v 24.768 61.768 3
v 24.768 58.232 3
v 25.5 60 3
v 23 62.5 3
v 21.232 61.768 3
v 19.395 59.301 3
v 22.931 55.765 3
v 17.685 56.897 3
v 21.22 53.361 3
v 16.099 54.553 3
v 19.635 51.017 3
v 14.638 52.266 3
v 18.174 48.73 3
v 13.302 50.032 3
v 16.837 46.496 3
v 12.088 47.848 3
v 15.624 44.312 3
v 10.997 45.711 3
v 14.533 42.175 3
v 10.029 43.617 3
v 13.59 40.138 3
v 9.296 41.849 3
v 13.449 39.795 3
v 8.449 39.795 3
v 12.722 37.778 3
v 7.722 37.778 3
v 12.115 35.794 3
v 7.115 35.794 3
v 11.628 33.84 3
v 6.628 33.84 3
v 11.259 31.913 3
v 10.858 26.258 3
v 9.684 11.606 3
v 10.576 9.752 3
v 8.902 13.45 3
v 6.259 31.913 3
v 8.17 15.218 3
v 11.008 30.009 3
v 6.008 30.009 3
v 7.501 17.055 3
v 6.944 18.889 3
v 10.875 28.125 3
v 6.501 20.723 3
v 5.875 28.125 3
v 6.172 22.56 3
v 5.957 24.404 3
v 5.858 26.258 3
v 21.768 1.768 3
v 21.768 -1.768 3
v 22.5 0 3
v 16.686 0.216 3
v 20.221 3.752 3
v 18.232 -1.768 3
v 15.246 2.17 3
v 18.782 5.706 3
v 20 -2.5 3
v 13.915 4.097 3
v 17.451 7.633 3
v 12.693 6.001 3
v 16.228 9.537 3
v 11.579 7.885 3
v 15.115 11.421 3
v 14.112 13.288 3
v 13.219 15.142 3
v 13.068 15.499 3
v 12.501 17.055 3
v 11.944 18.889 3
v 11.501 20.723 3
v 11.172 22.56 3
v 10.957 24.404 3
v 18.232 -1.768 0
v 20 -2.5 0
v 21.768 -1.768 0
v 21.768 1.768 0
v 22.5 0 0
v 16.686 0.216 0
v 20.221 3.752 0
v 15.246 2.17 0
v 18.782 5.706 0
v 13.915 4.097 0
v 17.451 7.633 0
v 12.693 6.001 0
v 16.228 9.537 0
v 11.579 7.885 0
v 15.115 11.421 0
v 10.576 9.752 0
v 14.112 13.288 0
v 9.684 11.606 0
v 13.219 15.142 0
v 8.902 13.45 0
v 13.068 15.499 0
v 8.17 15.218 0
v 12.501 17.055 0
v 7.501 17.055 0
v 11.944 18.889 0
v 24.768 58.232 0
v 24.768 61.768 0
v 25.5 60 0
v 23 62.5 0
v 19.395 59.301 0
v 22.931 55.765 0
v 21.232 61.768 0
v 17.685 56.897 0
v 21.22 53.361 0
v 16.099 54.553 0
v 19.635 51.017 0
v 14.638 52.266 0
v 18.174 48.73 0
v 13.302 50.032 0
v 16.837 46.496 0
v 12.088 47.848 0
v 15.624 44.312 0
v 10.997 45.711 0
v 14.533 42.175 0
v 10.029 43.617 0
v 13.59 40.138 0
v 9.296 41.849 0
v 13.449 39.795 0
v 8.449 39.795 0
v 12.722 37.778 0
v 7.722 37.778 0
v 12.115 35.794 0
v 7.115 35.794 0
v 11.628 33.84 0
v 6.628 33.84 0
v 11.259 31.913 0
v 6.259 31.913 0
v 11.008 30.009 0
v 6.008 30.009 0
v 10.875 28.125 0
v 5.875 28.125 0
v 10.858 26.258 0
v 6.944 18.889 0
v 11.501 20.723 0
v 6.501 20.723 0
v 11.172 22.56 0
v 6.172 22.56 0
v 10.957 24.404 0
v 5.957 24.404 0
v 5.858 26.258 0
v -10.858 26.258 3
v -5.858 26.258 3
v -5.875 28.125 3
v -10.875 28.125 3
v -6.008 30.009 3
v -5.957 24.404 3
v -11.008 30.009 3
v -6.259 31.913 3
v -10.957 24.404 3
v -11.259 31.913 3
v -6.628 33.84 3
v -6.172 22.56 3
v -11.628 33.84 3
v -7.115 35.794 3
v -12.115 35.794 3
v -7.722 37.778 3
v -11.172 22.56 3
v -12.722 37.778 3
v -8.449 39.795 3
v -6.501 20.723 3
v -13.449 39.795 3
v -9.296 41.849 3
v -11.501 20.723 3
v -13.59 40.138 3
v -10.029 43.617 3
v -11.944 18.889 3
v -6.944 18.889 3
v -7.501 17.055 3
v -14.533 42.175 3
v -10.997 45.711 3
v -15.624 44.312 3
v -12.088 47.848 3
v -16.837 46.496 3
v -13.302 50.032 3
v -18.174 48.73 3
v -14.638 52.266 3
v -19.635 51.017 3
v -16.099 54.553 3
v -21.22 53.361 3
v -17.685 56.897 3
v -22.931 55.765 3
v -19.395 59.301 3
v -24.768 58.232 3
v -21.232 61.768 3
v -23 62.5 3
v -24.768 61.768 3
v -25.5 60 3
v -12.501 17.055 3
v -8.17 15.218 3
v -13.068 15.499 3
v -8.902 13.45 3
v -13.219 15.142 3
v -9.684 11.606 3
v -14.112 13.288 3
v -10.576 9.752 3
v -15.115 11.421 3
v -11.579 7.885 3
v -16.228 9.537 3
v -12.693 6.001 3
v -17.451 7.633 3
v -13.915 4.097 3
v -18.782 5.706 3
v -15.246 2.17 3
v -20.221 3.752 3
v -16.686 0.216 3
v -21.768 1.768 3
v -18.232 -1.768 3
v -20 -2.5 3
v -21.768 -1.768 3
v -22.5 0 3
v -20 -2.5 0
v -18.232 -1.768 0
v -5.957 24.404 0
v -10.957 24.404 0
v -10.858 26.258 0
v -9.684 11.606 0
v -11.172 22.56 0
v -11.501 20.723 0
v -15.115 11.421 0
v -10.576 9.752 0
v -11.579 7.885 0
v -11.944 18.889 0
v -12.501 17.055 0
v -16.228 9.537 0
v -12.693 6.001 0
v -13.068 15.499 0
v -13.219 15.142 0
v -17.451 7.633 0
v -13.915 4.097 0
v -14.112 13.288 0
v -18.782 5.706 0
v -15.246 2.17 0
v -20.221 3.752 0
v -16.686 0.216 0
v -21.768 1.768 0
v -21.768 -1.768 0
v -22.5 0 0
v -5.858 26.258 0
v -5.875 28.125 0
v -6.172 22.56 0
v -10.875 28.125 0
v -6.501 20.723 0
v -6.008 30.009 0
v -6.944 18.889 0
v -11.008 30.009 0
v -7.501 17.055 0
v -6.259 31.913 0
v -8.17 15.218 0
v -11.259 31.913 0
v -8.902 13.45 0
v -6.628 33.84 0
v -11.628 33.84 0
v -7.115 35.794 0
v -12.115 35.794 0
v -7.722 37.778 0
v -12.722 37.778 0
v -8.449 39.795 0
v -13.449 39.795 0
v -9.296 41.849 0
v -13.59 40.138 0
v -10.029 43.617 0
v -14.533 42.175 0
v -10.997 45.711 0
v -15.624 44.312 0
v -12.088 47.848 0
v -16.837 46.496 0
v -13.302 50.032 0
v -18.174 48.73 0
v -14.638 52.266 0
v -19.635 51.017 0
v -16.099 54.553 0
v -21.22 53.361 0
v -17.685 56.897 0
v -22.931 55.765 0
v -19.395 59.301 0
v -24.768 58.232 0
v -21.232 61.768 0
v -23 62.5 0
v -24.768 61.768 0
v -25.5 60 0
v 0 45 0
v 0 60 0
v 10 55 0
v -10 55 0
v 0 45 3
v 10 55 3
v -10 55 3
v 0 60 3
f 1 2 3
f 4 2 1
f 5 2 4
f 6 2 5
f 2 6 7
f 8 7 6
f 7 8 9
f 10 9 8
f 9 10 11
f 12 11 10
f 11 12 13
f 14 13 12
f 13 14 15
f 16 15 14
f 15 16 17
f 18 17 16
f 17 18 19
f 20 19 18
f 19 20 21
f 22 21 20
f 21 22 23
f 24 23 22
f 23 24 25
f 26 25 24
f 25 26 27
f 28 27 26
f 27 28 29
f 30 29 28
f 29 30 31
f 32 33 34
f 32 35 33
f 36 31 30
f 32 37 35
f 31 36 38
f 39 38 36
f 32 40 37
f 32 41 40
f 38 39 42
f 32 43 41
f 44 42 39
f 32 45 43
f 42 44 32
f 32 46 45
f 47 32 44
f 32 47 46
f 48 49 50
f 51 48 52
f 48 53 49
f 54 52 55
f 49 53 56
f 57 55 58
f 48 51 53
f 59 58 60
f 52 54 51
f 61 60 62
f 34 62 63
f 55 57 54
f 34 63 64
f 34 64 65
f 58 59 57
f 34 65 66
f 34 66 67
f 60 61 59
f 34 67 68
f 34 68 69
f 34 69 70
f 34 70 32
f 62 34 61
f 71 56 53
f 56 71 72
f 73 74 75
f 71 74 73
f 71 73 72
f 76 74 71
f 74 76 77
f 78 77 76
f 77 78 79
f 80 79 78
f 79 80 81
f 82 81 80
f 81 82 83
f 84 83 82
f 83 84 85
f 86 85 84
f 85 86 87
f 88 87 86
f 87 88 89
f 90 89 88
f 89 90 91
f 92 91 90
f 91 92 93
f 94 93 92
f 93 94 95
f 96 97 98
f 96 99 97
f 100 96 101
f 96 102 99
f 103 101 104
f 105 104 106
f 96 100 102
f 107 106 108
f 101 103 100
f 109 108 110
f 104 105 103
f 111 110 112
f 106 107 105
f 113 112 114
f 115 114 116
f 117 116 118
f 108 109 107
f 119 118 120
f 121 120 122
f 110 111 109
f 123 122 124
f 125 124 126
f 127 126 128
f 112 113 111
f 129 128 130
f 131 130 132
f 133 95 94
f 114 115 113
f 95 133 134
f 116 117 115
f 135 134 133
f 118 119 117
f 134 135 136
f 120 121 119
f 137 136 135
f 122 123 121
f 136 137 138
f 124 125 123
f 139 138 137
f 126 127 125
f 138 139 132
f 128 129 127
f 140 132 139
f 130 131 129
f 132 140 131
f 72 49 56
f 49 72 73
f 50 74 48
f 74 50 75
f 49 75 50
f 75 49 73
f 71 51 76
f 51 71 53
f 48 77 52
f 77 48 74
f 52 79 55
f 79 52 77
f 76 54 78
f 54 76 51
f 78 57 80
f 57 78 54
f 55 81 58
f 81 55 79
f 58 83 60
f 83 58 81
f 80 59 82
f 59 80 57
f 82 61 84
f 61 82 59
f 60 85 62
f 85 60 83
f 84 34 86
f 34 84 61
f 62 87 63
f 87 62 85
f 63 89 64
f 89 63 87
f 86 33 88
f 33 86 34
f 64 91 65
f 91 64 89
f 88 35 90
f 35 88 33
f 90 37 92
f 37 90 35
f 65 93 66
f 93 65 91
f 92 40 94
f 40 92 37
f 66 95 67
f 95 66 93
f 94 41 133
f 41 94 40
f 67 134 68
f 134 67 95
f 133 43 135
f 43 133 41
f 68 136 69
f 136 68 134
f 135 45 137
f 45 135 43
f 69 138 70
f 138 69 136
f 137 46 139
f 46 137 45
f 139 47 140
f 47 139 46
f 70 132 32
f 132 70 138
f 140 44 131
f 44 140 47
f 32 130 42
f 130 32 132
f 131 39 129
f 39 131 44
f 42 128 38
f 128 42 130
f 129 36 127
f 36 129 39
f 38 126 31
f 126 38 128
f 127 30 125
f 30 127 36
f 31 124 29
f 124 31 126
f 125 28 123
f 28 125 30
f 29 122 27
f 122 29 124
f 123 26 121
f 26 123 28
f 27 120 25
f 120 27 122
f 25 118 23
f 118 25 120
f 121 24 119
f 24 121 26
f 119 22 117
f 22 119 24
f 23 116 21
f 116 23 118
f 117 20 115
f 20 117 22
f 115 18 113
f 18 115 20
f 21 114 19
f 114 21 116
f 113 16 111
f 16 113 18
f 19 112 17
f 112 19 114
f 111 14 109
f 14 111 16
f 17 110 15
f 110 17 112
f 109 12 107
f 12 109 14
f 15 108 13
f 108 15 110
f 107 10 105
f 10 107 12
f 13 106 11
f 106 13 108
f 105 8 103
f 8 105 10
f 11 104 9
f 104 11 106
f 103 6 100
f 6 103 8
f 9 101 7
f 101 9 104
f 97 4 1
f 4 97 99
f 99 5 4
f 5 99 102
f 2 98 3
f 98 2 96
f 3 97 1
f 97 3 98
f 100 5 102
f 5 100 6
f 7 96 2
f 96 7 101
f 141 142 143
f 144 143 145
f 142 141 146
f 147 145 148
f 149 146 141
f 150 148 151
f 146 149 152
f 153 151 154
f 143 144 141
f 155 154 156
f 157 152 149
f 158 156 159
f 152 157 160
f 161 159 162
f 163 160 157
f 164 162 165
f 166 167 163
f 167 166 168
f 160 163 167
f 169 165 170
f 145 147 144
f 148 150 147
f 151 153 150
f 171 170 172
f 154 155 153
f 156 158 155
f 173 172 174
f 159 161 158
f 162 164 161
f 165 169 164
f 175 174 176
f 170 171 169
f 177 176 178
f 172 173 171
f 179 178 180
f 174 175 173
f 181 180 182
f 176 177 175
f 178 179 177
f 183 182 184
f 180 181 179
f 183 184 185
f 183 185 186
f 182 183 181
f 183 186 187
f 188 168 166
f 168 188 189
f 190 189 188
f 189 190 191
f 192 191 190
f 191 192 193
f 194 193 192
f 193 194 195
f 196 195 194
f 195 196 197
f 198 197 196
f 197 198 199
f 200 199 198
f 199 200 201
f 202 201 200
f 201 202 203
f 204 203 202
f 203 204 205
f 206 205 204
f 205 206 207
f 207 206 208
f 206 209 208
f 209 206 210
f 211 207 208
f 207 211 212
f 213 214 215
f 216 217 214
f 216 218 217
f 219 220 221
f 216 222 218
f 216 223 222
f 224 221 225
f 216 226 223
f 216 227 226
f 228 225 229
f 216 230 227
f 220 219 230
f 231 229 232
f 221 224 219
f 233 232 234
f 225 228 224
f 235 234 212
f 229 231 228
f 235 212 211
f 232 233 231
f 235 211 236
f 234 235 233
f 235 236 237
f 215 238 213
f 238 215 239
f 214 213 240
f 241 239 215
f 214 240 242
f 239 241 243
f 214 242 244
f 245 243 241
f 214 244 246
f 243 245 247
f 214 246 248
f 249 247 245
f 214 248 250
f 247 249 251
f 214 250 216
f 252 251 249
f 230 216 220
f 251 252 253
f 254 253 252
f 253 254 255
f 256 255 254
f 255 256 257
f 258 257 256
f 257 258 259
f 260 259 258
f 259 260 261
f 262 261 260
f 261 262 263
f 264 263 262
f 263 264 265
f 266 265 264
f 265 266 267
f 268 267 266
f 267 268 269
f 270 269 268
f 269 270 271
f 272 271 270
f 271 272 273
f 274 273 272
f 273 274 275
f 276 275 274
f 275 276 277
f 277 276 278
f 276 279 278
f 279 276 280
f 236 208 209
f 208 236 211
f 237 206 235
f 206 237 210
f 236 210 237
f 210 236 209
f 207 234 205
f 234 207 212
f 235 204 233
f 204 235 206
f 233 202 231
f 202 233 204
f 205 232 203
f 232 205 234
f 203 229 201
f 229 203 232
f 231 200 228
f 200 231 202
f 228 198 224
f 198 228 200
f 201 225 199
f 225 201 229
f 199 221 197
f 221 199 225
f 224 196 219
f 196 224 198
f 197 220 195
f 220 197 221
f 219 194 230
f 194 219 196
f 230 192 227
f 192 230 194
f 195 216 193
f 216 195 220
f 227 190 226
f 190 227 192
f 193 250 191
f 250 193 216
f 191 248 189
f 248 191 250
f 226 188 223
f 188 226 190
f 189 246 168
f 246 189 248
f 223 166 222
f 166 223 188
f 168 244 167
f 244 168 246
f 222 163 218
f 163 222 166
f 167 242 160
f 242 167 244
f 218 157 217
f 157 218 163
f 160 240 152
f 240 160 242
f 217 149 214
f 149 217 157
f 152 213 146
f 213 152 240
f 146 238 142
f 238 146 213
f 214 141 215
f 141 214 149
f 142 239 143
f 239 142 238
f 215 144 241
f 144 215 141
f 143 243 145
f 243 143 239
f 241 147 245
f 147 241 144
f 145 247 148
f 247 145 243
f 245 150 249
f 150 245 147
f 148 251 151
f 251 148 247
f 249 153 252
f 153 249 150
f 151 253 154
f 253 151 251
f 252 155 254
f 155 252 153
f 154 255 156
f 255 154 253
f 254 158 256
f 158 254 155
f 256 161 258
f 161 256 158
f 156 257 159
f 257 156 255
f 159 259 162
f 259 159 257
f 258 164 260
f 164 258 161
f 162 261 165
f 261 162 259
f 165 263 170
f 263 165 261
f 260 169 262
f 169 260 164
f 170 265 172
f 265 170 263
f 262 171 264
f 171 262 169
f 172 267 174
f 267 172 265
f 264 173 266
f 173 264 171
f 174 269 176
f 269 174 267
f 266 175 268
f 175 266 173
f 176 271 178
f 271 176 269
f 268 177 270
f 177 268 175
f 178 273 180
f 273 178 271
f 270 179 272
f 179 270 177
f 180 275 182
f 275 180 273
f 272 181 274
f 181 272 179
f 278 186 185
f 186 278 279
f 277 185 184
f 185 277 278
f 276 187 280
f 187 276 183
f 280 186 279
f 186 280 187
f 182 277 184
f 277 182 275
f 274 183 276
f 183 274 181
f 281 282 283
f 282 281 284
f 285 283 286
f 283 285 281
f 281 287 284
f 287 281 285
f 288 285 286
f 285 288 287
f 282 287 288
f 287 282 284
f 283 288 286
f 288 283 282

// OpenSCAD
// パラメータ
thickness = 5;      // 線の太さ
segments = 30;       // 曲線の分割数
diamond_size = 20;   // ダイヤのサイズ

// Bézier曲線の計算（3次）
function bezier3(p0, p1, p2, p3, t) =
    let(
        u  = 1 - t,
        b0 = u*u*u,
        b1 = 3 * u*u * t,
        b2 = 3 * u * t*t,
        b3 = t*t*t
    )
    [ 
        p0[0]*b0 + p1[0]*b1 + p2[0]*b2 + p3[0]*b3,
        p0[1]*b0 + p1[1]*b1 + p2[1]*b2 + p3[1]*b3
    ];

// 曲線モジュール（厚み付き）
module thick_curve(p0, p1, p2, p3) {
    // 各点に円を置き、隣り合う円をhull()して太い線を表現
    pts = [ for (i = [0 : segments]) bezier3(p0, p1, p2, p3, i/segments) ];
    for (i = [0 : len(pts)-2]) {
        linear_extrude(3)
        hull() {
            translate([ pts[i][0], pts[i][1], 0 ])
                circle(d = thickness);
            translate([ pts[i+1][0], pts[i+1][1], 0 ])
                circle(d = thickness);
        }
    }
}

p0_left = [ 20,   0];
p1_left = [ 4, 20];
p2_left = [ 4, 35];
p3_left = [ 23, 60];

// 左右対称に描画
thick_curve(p0_left, p1_left, p2_left, p3_left);
mirror([1, 0, 0]) 
    thick_curve(p0_left, p1_left, p2_left, p3_left);

// 中央上部のダイヤ
module diamond(center=[100,220], size=diamond_size) {
    linear_extrude(3)
    polygon(points = [
        [ center[0]    , center[1] + size/4 ],
        [ center[0] - size/2, center[1] ],
        [ center[0]    , center[1] - size/2 ],
        [ center[0] + size/2, center[1] ]
    ]);
}

// ダイヤを少し持ち上げて配置
    diamond([0, 55], diamond_size);
